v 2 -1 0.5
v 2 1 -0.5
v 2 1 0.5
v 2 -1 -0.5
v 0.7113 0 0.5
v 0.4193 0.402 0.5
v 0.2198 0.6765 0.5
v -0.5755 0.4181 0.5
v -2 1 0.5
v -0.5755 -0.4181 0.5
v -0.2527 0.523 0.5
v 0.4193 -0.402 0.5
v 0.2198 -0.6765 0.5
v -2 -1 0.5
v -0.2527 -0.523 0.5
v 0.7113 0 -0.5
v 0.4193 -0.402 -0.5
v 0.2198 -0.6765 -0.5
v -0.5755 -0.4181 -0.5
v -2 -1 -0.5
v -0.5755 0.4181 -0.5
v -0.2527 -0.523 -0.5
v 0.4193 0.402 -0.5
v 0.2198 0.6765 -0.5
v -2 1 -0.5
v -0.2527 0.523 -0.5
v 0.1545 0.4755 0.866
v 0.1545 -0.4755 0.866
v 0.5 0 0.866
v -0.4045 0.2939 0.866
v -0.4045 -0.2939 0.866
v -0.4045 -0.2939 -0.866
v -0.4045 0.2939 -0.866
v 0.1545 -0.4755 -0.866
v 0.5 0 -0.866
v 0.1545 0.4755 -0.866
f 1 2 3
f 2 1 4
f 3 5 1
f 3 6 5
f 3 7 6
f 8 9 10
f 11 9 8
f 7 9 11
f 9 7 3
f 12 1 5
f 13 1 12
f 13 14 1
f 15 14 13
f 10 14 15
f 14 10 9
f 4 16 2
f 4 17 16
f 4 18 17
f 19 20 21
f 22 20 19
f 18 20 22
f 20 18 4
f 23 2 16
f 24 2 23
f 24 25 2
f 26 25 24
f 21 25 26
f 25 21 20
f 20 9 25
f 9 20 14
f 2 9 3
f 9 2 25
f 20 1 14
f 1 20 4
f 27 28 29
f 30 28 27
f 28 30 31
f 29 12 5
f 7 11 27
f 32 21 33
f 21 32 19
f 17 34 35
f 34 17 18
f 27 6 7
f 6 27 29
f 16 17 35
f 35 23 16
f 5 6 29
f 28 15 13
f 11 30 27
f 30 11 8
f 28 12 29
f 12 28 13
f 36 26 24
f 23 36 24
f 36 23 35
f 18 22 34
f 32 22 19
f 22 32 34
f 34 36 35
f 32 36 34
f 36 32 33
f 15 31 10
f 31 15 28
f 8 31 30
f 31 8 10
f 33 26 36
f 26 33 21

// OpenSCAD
union() {
    cube(size=[4, 2, 1], center=true);
    sphere(r=1);
};
